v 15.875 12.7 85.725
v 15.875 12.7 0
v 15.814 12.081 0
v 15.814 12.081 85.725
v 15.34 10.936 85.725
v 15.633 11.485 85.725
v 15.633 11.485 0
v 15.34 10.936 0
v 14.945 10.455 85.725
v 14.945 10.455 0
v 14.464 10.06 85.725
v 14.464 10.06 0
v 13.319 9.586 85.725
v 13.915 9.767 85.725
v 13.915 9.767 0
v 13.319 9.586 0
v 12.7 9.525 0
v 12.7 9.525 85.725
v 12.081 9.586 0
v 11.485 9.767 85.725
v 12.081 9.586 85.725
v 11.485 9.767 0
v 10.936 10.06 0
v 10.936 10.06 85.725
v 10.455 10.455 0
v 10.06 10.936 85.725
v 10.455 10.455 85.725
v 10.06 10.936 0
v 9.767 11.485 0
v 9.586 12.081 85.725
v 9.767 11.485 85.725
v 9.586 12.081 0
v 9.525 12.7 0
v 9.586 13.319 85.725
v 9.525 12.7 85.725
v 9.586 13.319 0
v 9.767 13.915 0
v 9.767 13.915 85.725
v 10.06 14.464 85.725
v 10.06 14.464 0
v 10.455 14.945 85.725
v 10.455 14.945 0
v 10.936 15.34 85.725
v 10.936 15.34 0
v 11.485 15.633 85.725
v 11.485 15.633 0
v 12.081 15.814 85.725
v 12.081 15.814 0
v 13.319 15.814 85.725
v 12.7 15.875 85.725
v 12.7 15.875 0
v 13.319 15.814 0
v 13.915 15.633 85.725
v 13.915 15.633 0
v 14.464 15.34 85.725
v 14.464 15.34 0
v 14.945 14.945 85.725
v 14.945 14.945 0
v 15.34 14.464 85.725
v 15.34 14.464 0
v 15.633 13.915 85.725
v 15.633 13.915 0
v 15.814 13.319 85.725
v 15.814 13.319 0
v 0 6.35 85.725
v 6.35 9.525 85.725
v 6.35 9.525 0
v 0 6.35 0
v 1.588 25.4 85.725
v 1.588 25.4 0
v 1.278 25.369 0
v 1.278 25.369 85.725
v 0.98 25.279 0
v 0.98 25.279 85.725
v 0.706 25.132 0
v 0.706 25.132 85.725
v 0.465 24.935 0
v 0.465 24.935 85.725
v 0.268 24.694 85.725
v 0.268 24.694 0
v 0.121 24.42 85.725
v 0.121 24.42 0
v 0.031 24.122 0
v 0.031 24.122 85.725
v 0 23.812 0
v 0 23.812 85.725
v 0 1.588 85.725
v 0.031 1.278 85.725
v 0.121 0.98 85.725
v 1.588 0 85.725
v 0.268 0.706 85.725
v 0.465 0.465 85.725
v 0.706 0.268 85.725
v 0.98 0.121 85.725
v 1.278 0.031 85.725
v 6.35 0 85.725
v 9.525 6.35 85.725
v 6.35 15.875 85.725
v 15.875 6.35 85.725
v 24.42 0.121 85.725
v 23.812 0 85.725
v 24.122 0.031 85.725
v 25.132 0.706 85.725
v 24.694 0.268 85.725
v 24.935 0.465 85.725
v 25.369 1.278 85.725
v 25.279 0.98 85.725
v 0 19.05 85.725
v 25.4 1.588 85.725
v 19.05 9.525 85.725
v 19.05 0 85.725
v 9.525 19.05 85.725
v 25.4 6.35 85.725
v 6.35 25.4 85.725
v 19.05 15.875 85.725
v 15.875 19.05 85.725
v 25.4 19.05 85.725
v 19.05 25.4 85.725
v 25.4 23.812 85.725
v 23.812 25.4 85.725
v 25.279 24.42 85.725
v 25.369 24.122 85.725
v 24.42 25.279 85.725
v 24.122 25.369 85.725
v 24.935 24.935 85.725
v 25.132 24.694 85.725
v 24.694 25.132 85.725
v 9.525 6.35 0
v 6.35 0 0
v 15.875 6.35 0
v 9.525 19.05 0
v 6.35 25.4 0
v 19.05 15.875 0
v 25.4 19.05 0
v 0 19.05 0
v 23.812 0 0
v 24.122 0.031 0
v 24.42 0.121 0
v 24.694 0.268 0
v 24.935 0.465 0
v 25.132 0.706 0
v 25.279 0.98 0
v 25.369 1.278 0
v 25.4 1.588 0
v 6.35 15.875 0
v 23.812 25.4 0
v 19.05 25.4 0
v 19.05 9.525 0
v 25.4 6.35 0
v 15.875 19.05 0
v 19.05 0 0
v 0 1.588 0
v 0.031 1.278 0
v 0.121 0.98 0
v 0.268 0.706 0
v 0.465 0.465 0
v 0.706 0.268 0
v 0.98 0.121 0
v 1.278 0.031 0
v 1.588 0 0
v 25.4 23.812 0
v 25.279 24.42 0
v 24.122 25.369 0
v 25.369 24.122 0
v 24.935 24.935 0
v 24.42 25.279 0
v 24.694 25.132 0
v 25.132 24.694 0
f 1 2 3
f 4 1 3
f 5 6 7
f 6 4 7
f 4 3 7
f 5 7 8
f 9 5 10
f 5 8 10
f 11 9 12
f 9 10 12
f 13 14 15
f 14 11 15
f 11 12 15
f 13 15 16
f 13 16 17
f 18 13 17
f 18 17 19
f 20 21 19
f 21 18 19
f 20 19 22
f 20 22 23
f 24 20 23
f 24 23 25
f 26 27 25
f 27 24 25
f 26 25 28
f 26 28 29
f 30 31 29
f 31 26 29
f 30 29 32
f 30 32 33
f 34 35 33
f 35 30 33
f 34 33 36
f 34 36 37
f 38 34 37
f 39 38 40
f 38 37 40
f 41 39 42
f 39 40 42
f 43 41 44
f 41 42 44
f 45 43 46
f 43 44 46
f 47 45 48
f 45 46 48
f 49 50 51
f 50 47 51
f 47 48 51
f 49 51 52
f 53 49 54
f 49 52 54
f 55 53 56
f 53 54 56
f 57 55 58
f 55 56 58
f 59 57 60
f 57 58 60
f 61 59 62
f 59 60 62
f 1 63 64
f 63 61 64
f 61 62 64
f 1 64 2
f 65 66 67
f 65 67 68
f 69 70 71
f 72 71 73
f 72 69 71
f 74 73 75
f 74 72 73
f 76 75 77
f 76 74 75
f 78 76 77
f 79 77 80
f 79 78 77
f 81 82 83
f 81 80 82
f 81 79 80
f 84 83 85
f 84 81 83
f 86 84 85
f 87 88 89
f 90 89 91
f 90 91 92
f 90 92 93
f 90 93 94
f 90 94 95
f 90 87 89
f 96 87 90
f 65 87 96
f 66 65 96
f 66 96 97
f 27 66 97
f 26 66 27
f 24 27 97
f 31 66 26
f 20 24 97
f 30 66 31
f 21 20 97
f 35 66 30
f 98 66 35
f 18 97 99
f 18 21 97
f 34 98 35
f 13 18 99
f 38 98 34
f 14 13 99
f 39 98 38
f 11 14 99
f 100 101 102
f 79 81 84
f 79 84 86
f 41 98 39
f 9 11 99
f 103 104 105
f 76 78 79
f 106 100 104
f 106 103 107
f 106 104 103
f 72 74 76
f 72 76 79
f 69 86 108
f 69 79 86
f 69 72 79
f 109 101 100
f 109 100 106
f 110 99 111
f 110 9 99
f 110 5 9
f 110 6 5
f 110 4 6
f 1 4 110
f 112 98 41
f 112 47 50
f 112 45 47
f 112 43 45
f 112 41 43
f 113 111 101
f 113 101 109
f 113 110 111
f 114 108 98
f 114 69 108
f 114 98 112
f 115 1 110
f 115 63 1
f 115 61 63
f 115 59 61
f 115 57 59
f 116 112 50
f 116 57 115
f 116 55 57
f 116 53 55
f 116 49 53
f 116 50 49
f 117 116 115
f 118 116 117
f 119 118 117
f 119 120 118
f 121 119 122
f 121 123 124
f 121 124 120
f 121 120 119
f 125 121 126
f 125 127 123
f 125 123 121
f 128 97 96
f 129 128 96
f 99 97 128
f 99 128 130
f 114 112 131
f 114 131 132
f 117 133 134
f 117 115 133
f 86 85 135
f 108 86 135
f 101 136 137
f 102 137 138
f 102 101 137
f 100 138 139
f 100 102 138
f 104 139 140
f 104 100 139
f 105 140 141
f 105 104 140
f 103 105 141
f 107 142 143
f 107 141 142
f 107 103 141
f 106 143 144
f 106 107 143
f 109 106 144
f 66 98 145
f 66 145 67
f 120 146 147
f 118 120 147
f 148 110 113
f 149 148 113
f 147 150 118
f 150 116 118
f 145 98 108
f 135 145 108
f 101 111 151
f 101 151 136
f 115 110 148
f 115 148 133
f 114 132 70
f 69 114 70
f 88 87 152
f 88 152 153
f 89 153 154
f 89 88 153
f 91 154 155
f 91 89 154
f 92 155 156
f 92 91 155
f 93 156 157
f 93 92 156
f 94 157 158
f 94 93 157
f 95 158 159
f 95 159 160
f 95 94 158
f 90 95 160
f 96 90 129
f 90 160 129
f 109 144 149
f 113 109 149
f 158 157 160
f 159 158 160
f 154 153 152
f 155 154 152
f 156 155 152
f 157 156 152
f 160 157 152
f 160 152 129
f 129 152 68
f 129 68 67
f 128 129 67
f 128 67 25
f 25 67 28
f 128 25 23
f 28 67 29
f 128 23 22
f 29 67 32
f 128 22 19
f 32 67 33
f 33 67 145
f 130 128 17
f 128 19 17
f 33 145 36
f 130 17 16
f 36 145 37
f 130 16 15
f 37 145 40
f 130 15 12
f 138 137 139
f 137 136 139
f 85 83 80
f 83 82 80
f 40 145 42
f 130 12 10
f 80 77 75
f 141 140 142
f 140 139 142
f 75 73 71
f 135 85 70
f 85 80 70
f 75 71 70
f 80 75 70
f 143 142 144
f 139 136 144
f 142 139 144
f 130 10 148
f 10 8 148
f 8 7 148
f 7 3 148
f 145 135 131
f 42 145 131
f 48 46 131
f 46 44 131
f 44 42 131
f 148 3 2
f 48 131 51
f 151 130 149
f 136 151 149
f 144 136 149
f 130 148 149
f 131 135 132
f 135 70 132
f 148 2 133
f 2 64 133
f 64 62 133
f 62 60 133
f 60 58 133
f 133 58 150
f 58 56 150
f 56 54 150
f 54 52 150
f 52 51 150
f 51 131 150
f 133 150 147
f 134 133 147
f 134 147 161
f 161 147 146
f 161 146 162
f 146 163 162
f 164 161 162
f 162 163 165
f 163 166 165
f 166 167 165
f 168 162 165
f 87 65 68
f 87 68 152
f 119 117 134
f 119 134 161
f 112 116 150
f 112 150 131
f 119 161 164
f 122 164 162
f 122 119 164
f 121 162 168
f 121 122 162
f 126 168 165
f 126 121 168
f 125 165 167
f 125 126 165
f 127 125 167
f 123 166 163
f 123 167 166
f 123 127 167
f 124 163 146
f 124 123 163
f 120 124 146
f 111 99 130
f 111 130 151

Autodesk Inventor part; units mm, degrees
ref_plane "YZ Plane" through (0, 0, 0) normal (1, 0, 0) x (0, 1, 0)
ref_plane "XZ Plane" through (0, 0, 0) normal (0, 1, 0) x (-1, 0, 0)
ref_plane "XY Plane" through (0, 0, 0) normal (0, 0, 1) x (1, 0, 0)
sketch "Sketch1" plane through (0, 0, 0) normal (0, 0, 1) x (1, 0, 0)
  line L0 (0, 0) -> (25.4, 0)
  line L1 (25.4, 0) -> (25.4, 25.4)
  line L2 (25.4, 25.4) -> (0, 25.4)
  line L3 (0, 25.4) -> (0, 0)
  circle A0 centre (12.7, 12.7) radius 3.175
  dimension "d0" = 25.4
  dimension "d1" = 25.4
  dimension "d2" = 6.35
  dimension "d7" = 12.7
  dimension "d8" = 12.7
extrude "Extrusion1" add sketch "Sketch1" along normal blind 609.6
sketch "Sketch2" plane through (0, 0, 609.6) normal (0, 0, 1) x (1, 0, 0)
  line L0 (25.4, 25.4) -> (0, 25.4) projected
  line L1 (0, 25.4) -> (0, 0) projected
  circle A0 centre (12.7, 12.7) radius 3.175 projected
  line L2 (0, 0) -> (25.4, 0) projected
  line L3 (25.4, 0) -> (25.4, 25.4) projected
  line L4 (25.4, 25.4) -> (0, 25.4) projected
  line L5 (0, 25.4) -> (0, 0) projected
  line L6 (12.7, 19.05) -> (9.525, 19.05)
  line L7 (9.525, 19.05) -> (15.875, 19.05)
  line L8 (15.875, 19.05) -> (19.05, 25.4)
  line L9 (9.525, 19.05) -> (6.35, 25.4)
  dimension "d13" = 6.35
  dimension "d14" = 6.35
  dimension "d15" = 3.175
  dimension "d16" = 6.35
fillet "Fillet1" radius 1.5875 4 edges at (25.4, 25.4, 304.8) (0, 25.4, 304.8) (25.4, 0, 304.8) (0, 0, 304.8)
extrude "Extrusion2" cut sketch "Sketch2" against normal blind 609.6 contours L8 L7 L6 L9 L0
pattern_circular "Circular Pattern1" count 4 over 360 about axis through (12.7, 12.7, 0) along (0, 0, 1) of "Extrusion2"
sketch "Sketch3" plane through (0, 0, 609.6) normal (0, 0, 1) x (1, 0, 0)
  line L0 (19.05, 15.875) -> (25.4, 19.05) projected
  line L1 (25.4, 19.05) -> (25.4, 23.8125) projected
  arc A0 (25.4, 23.8125) -> (23.8125, 25.4) centre (23.8125, 23.8125) ccw projected
  line L2 (23.8125, 25.4) -> (19.05, 25.4) projected
  line L3 (19.05, 25.4) -> (15.875, 19.05) projected
  line L4 (15.875, 19.05) -> (9.525, 19.05) projected
  line L5 (9.525, 19.05) -> (6.35, 25.4) projected
  line L6 (6.35, 25.4) -> (1.5875, 25.4) projected
  arc A1 (1.5875, 25.4) -> (0, 23.8125) centre (1.5875, 23.8125) ccw projected
  line L7 (0, 23.8125) -> (0, 19.05) projected
  line L8 (0, 19.05) -> (6.35, 15.875) projected
  line L9 (6.35, 15.875) -> (6.35, 9.525) projected
  line L10 (6.35, 9.525) -> (0, 6.35) projected
  line L11 (0, 6.35) -> (0, 1.5875) projected
  arc A2 (0, 1.5875) -> (1.5875, 0) centre (1.5875, 1.5875) ccw projected
  line L12 (1.5875, 0) -> (6.35, 0) projected
  line L13 (6.35, 0) -> (9.525, 6.35) projected
  line L14 (9.525, 6.35) -> (15.875, 6.35) projected
  line L15 (15.875, 6.35) -> (19.05, 0) projected
  line L16 (19.05, 0) -> (23.8125, 0) projected
  arc A3 (23.8125, 0) -> (25.4, 1.5875) centre (23.8125, 1.5875) ccw projected
  line L17 (25.4, 1.5875) -> (25.4, 6.35) projected
  line L18 (25.4, 6.35) -> (19.05, 9.525) projected
  line L19 (19.05, 9.525) -> (19.05, 15.875) projected
  circle A4 centre (12.7, 12.7) radius 3.175 projected
  point P0 (0, 0)
extrude "Extrusion3" cut sketch "Sketch3" against normal blind 517.525
sketch "Sketch4" plane through (0, 0, 92.075) normal (0, 0, 1) x (1, 0, 0)
  circle A0 centre (12.7, 12.7) radius 3.175 projected
  line L0 (25.4, 19.05) -> (19.05, 15.875) projected
  line L1 (25.4, 23.8125) -> (25.4, 19.05) projected
  arc A1 (25.4, 23.8125) -> (23.8125, 25.4) centre (23.8125, 23.8125) ccw projected
  line L2 (19.05, 25.4) -> (23.8125, 25.4) projected
  line L3 (15.875, 19.05) -> (19.05, 25.4) projected
  line L4 (9.525, 19.05) -> (15.875, 19.05) projected
  line L5 (6.35, 25.4) -> (9.525, 19.05) projected
  line L6 (1.5875, 25.4) -> (6.35, 25.4) projected
  arc A2 (1.5875, 25.4) -> (0, 23.8125) centre (1.5875, 23.8125) ccw projected
  line L7 (0, 19.05) -> (0, 23.8125) projected
  line L8 (6.35, 15.875) -> (0, 19.05) projected
  line L9 (6.35, 9.525) -> (6.35, 15.875) projected
  line L10 (0, 6.35) -> (6.35, 9.525) projected
  line L11 (0, 1.5875) -> (0, 6.35) projected
  arc A3 (0, 1.5875) -> (1.5875, 0) centre (1.5875, 1.5875) ccw projected
  line L12 (6.35, 0) -> (1.5875, 0) projected
  line L13 (9.525, 6.35) -> (6.35, 0) projected
  line L14 (15.875, 6.35) -> (9.525, 6.35) projected
  line L15 (19.05, 0) -> (15.875, 6.35) projected
  line L16 (23.8125, 0) -> (19.05, 0) projected
  arc A4 (23.8125, 0) -> (25.4, 1.5875) centre (23.8125, 1.5875) ccw projected
  line L17 (25.4, 6.35) -> (25.4, 1.5875) projected
  line L18 (19.05, 9.525) -> (25.4, 6.35) projected
  line L19 (19.05, 15.875) -> (19.05, 9.525) projected
  point P0 (0, 0)
extrude "Extrusion4" cut sketch "Sketch4" against normal blind 6.35
properties part number "Mock 8020 3.375in" material "Aluminum 6061"
